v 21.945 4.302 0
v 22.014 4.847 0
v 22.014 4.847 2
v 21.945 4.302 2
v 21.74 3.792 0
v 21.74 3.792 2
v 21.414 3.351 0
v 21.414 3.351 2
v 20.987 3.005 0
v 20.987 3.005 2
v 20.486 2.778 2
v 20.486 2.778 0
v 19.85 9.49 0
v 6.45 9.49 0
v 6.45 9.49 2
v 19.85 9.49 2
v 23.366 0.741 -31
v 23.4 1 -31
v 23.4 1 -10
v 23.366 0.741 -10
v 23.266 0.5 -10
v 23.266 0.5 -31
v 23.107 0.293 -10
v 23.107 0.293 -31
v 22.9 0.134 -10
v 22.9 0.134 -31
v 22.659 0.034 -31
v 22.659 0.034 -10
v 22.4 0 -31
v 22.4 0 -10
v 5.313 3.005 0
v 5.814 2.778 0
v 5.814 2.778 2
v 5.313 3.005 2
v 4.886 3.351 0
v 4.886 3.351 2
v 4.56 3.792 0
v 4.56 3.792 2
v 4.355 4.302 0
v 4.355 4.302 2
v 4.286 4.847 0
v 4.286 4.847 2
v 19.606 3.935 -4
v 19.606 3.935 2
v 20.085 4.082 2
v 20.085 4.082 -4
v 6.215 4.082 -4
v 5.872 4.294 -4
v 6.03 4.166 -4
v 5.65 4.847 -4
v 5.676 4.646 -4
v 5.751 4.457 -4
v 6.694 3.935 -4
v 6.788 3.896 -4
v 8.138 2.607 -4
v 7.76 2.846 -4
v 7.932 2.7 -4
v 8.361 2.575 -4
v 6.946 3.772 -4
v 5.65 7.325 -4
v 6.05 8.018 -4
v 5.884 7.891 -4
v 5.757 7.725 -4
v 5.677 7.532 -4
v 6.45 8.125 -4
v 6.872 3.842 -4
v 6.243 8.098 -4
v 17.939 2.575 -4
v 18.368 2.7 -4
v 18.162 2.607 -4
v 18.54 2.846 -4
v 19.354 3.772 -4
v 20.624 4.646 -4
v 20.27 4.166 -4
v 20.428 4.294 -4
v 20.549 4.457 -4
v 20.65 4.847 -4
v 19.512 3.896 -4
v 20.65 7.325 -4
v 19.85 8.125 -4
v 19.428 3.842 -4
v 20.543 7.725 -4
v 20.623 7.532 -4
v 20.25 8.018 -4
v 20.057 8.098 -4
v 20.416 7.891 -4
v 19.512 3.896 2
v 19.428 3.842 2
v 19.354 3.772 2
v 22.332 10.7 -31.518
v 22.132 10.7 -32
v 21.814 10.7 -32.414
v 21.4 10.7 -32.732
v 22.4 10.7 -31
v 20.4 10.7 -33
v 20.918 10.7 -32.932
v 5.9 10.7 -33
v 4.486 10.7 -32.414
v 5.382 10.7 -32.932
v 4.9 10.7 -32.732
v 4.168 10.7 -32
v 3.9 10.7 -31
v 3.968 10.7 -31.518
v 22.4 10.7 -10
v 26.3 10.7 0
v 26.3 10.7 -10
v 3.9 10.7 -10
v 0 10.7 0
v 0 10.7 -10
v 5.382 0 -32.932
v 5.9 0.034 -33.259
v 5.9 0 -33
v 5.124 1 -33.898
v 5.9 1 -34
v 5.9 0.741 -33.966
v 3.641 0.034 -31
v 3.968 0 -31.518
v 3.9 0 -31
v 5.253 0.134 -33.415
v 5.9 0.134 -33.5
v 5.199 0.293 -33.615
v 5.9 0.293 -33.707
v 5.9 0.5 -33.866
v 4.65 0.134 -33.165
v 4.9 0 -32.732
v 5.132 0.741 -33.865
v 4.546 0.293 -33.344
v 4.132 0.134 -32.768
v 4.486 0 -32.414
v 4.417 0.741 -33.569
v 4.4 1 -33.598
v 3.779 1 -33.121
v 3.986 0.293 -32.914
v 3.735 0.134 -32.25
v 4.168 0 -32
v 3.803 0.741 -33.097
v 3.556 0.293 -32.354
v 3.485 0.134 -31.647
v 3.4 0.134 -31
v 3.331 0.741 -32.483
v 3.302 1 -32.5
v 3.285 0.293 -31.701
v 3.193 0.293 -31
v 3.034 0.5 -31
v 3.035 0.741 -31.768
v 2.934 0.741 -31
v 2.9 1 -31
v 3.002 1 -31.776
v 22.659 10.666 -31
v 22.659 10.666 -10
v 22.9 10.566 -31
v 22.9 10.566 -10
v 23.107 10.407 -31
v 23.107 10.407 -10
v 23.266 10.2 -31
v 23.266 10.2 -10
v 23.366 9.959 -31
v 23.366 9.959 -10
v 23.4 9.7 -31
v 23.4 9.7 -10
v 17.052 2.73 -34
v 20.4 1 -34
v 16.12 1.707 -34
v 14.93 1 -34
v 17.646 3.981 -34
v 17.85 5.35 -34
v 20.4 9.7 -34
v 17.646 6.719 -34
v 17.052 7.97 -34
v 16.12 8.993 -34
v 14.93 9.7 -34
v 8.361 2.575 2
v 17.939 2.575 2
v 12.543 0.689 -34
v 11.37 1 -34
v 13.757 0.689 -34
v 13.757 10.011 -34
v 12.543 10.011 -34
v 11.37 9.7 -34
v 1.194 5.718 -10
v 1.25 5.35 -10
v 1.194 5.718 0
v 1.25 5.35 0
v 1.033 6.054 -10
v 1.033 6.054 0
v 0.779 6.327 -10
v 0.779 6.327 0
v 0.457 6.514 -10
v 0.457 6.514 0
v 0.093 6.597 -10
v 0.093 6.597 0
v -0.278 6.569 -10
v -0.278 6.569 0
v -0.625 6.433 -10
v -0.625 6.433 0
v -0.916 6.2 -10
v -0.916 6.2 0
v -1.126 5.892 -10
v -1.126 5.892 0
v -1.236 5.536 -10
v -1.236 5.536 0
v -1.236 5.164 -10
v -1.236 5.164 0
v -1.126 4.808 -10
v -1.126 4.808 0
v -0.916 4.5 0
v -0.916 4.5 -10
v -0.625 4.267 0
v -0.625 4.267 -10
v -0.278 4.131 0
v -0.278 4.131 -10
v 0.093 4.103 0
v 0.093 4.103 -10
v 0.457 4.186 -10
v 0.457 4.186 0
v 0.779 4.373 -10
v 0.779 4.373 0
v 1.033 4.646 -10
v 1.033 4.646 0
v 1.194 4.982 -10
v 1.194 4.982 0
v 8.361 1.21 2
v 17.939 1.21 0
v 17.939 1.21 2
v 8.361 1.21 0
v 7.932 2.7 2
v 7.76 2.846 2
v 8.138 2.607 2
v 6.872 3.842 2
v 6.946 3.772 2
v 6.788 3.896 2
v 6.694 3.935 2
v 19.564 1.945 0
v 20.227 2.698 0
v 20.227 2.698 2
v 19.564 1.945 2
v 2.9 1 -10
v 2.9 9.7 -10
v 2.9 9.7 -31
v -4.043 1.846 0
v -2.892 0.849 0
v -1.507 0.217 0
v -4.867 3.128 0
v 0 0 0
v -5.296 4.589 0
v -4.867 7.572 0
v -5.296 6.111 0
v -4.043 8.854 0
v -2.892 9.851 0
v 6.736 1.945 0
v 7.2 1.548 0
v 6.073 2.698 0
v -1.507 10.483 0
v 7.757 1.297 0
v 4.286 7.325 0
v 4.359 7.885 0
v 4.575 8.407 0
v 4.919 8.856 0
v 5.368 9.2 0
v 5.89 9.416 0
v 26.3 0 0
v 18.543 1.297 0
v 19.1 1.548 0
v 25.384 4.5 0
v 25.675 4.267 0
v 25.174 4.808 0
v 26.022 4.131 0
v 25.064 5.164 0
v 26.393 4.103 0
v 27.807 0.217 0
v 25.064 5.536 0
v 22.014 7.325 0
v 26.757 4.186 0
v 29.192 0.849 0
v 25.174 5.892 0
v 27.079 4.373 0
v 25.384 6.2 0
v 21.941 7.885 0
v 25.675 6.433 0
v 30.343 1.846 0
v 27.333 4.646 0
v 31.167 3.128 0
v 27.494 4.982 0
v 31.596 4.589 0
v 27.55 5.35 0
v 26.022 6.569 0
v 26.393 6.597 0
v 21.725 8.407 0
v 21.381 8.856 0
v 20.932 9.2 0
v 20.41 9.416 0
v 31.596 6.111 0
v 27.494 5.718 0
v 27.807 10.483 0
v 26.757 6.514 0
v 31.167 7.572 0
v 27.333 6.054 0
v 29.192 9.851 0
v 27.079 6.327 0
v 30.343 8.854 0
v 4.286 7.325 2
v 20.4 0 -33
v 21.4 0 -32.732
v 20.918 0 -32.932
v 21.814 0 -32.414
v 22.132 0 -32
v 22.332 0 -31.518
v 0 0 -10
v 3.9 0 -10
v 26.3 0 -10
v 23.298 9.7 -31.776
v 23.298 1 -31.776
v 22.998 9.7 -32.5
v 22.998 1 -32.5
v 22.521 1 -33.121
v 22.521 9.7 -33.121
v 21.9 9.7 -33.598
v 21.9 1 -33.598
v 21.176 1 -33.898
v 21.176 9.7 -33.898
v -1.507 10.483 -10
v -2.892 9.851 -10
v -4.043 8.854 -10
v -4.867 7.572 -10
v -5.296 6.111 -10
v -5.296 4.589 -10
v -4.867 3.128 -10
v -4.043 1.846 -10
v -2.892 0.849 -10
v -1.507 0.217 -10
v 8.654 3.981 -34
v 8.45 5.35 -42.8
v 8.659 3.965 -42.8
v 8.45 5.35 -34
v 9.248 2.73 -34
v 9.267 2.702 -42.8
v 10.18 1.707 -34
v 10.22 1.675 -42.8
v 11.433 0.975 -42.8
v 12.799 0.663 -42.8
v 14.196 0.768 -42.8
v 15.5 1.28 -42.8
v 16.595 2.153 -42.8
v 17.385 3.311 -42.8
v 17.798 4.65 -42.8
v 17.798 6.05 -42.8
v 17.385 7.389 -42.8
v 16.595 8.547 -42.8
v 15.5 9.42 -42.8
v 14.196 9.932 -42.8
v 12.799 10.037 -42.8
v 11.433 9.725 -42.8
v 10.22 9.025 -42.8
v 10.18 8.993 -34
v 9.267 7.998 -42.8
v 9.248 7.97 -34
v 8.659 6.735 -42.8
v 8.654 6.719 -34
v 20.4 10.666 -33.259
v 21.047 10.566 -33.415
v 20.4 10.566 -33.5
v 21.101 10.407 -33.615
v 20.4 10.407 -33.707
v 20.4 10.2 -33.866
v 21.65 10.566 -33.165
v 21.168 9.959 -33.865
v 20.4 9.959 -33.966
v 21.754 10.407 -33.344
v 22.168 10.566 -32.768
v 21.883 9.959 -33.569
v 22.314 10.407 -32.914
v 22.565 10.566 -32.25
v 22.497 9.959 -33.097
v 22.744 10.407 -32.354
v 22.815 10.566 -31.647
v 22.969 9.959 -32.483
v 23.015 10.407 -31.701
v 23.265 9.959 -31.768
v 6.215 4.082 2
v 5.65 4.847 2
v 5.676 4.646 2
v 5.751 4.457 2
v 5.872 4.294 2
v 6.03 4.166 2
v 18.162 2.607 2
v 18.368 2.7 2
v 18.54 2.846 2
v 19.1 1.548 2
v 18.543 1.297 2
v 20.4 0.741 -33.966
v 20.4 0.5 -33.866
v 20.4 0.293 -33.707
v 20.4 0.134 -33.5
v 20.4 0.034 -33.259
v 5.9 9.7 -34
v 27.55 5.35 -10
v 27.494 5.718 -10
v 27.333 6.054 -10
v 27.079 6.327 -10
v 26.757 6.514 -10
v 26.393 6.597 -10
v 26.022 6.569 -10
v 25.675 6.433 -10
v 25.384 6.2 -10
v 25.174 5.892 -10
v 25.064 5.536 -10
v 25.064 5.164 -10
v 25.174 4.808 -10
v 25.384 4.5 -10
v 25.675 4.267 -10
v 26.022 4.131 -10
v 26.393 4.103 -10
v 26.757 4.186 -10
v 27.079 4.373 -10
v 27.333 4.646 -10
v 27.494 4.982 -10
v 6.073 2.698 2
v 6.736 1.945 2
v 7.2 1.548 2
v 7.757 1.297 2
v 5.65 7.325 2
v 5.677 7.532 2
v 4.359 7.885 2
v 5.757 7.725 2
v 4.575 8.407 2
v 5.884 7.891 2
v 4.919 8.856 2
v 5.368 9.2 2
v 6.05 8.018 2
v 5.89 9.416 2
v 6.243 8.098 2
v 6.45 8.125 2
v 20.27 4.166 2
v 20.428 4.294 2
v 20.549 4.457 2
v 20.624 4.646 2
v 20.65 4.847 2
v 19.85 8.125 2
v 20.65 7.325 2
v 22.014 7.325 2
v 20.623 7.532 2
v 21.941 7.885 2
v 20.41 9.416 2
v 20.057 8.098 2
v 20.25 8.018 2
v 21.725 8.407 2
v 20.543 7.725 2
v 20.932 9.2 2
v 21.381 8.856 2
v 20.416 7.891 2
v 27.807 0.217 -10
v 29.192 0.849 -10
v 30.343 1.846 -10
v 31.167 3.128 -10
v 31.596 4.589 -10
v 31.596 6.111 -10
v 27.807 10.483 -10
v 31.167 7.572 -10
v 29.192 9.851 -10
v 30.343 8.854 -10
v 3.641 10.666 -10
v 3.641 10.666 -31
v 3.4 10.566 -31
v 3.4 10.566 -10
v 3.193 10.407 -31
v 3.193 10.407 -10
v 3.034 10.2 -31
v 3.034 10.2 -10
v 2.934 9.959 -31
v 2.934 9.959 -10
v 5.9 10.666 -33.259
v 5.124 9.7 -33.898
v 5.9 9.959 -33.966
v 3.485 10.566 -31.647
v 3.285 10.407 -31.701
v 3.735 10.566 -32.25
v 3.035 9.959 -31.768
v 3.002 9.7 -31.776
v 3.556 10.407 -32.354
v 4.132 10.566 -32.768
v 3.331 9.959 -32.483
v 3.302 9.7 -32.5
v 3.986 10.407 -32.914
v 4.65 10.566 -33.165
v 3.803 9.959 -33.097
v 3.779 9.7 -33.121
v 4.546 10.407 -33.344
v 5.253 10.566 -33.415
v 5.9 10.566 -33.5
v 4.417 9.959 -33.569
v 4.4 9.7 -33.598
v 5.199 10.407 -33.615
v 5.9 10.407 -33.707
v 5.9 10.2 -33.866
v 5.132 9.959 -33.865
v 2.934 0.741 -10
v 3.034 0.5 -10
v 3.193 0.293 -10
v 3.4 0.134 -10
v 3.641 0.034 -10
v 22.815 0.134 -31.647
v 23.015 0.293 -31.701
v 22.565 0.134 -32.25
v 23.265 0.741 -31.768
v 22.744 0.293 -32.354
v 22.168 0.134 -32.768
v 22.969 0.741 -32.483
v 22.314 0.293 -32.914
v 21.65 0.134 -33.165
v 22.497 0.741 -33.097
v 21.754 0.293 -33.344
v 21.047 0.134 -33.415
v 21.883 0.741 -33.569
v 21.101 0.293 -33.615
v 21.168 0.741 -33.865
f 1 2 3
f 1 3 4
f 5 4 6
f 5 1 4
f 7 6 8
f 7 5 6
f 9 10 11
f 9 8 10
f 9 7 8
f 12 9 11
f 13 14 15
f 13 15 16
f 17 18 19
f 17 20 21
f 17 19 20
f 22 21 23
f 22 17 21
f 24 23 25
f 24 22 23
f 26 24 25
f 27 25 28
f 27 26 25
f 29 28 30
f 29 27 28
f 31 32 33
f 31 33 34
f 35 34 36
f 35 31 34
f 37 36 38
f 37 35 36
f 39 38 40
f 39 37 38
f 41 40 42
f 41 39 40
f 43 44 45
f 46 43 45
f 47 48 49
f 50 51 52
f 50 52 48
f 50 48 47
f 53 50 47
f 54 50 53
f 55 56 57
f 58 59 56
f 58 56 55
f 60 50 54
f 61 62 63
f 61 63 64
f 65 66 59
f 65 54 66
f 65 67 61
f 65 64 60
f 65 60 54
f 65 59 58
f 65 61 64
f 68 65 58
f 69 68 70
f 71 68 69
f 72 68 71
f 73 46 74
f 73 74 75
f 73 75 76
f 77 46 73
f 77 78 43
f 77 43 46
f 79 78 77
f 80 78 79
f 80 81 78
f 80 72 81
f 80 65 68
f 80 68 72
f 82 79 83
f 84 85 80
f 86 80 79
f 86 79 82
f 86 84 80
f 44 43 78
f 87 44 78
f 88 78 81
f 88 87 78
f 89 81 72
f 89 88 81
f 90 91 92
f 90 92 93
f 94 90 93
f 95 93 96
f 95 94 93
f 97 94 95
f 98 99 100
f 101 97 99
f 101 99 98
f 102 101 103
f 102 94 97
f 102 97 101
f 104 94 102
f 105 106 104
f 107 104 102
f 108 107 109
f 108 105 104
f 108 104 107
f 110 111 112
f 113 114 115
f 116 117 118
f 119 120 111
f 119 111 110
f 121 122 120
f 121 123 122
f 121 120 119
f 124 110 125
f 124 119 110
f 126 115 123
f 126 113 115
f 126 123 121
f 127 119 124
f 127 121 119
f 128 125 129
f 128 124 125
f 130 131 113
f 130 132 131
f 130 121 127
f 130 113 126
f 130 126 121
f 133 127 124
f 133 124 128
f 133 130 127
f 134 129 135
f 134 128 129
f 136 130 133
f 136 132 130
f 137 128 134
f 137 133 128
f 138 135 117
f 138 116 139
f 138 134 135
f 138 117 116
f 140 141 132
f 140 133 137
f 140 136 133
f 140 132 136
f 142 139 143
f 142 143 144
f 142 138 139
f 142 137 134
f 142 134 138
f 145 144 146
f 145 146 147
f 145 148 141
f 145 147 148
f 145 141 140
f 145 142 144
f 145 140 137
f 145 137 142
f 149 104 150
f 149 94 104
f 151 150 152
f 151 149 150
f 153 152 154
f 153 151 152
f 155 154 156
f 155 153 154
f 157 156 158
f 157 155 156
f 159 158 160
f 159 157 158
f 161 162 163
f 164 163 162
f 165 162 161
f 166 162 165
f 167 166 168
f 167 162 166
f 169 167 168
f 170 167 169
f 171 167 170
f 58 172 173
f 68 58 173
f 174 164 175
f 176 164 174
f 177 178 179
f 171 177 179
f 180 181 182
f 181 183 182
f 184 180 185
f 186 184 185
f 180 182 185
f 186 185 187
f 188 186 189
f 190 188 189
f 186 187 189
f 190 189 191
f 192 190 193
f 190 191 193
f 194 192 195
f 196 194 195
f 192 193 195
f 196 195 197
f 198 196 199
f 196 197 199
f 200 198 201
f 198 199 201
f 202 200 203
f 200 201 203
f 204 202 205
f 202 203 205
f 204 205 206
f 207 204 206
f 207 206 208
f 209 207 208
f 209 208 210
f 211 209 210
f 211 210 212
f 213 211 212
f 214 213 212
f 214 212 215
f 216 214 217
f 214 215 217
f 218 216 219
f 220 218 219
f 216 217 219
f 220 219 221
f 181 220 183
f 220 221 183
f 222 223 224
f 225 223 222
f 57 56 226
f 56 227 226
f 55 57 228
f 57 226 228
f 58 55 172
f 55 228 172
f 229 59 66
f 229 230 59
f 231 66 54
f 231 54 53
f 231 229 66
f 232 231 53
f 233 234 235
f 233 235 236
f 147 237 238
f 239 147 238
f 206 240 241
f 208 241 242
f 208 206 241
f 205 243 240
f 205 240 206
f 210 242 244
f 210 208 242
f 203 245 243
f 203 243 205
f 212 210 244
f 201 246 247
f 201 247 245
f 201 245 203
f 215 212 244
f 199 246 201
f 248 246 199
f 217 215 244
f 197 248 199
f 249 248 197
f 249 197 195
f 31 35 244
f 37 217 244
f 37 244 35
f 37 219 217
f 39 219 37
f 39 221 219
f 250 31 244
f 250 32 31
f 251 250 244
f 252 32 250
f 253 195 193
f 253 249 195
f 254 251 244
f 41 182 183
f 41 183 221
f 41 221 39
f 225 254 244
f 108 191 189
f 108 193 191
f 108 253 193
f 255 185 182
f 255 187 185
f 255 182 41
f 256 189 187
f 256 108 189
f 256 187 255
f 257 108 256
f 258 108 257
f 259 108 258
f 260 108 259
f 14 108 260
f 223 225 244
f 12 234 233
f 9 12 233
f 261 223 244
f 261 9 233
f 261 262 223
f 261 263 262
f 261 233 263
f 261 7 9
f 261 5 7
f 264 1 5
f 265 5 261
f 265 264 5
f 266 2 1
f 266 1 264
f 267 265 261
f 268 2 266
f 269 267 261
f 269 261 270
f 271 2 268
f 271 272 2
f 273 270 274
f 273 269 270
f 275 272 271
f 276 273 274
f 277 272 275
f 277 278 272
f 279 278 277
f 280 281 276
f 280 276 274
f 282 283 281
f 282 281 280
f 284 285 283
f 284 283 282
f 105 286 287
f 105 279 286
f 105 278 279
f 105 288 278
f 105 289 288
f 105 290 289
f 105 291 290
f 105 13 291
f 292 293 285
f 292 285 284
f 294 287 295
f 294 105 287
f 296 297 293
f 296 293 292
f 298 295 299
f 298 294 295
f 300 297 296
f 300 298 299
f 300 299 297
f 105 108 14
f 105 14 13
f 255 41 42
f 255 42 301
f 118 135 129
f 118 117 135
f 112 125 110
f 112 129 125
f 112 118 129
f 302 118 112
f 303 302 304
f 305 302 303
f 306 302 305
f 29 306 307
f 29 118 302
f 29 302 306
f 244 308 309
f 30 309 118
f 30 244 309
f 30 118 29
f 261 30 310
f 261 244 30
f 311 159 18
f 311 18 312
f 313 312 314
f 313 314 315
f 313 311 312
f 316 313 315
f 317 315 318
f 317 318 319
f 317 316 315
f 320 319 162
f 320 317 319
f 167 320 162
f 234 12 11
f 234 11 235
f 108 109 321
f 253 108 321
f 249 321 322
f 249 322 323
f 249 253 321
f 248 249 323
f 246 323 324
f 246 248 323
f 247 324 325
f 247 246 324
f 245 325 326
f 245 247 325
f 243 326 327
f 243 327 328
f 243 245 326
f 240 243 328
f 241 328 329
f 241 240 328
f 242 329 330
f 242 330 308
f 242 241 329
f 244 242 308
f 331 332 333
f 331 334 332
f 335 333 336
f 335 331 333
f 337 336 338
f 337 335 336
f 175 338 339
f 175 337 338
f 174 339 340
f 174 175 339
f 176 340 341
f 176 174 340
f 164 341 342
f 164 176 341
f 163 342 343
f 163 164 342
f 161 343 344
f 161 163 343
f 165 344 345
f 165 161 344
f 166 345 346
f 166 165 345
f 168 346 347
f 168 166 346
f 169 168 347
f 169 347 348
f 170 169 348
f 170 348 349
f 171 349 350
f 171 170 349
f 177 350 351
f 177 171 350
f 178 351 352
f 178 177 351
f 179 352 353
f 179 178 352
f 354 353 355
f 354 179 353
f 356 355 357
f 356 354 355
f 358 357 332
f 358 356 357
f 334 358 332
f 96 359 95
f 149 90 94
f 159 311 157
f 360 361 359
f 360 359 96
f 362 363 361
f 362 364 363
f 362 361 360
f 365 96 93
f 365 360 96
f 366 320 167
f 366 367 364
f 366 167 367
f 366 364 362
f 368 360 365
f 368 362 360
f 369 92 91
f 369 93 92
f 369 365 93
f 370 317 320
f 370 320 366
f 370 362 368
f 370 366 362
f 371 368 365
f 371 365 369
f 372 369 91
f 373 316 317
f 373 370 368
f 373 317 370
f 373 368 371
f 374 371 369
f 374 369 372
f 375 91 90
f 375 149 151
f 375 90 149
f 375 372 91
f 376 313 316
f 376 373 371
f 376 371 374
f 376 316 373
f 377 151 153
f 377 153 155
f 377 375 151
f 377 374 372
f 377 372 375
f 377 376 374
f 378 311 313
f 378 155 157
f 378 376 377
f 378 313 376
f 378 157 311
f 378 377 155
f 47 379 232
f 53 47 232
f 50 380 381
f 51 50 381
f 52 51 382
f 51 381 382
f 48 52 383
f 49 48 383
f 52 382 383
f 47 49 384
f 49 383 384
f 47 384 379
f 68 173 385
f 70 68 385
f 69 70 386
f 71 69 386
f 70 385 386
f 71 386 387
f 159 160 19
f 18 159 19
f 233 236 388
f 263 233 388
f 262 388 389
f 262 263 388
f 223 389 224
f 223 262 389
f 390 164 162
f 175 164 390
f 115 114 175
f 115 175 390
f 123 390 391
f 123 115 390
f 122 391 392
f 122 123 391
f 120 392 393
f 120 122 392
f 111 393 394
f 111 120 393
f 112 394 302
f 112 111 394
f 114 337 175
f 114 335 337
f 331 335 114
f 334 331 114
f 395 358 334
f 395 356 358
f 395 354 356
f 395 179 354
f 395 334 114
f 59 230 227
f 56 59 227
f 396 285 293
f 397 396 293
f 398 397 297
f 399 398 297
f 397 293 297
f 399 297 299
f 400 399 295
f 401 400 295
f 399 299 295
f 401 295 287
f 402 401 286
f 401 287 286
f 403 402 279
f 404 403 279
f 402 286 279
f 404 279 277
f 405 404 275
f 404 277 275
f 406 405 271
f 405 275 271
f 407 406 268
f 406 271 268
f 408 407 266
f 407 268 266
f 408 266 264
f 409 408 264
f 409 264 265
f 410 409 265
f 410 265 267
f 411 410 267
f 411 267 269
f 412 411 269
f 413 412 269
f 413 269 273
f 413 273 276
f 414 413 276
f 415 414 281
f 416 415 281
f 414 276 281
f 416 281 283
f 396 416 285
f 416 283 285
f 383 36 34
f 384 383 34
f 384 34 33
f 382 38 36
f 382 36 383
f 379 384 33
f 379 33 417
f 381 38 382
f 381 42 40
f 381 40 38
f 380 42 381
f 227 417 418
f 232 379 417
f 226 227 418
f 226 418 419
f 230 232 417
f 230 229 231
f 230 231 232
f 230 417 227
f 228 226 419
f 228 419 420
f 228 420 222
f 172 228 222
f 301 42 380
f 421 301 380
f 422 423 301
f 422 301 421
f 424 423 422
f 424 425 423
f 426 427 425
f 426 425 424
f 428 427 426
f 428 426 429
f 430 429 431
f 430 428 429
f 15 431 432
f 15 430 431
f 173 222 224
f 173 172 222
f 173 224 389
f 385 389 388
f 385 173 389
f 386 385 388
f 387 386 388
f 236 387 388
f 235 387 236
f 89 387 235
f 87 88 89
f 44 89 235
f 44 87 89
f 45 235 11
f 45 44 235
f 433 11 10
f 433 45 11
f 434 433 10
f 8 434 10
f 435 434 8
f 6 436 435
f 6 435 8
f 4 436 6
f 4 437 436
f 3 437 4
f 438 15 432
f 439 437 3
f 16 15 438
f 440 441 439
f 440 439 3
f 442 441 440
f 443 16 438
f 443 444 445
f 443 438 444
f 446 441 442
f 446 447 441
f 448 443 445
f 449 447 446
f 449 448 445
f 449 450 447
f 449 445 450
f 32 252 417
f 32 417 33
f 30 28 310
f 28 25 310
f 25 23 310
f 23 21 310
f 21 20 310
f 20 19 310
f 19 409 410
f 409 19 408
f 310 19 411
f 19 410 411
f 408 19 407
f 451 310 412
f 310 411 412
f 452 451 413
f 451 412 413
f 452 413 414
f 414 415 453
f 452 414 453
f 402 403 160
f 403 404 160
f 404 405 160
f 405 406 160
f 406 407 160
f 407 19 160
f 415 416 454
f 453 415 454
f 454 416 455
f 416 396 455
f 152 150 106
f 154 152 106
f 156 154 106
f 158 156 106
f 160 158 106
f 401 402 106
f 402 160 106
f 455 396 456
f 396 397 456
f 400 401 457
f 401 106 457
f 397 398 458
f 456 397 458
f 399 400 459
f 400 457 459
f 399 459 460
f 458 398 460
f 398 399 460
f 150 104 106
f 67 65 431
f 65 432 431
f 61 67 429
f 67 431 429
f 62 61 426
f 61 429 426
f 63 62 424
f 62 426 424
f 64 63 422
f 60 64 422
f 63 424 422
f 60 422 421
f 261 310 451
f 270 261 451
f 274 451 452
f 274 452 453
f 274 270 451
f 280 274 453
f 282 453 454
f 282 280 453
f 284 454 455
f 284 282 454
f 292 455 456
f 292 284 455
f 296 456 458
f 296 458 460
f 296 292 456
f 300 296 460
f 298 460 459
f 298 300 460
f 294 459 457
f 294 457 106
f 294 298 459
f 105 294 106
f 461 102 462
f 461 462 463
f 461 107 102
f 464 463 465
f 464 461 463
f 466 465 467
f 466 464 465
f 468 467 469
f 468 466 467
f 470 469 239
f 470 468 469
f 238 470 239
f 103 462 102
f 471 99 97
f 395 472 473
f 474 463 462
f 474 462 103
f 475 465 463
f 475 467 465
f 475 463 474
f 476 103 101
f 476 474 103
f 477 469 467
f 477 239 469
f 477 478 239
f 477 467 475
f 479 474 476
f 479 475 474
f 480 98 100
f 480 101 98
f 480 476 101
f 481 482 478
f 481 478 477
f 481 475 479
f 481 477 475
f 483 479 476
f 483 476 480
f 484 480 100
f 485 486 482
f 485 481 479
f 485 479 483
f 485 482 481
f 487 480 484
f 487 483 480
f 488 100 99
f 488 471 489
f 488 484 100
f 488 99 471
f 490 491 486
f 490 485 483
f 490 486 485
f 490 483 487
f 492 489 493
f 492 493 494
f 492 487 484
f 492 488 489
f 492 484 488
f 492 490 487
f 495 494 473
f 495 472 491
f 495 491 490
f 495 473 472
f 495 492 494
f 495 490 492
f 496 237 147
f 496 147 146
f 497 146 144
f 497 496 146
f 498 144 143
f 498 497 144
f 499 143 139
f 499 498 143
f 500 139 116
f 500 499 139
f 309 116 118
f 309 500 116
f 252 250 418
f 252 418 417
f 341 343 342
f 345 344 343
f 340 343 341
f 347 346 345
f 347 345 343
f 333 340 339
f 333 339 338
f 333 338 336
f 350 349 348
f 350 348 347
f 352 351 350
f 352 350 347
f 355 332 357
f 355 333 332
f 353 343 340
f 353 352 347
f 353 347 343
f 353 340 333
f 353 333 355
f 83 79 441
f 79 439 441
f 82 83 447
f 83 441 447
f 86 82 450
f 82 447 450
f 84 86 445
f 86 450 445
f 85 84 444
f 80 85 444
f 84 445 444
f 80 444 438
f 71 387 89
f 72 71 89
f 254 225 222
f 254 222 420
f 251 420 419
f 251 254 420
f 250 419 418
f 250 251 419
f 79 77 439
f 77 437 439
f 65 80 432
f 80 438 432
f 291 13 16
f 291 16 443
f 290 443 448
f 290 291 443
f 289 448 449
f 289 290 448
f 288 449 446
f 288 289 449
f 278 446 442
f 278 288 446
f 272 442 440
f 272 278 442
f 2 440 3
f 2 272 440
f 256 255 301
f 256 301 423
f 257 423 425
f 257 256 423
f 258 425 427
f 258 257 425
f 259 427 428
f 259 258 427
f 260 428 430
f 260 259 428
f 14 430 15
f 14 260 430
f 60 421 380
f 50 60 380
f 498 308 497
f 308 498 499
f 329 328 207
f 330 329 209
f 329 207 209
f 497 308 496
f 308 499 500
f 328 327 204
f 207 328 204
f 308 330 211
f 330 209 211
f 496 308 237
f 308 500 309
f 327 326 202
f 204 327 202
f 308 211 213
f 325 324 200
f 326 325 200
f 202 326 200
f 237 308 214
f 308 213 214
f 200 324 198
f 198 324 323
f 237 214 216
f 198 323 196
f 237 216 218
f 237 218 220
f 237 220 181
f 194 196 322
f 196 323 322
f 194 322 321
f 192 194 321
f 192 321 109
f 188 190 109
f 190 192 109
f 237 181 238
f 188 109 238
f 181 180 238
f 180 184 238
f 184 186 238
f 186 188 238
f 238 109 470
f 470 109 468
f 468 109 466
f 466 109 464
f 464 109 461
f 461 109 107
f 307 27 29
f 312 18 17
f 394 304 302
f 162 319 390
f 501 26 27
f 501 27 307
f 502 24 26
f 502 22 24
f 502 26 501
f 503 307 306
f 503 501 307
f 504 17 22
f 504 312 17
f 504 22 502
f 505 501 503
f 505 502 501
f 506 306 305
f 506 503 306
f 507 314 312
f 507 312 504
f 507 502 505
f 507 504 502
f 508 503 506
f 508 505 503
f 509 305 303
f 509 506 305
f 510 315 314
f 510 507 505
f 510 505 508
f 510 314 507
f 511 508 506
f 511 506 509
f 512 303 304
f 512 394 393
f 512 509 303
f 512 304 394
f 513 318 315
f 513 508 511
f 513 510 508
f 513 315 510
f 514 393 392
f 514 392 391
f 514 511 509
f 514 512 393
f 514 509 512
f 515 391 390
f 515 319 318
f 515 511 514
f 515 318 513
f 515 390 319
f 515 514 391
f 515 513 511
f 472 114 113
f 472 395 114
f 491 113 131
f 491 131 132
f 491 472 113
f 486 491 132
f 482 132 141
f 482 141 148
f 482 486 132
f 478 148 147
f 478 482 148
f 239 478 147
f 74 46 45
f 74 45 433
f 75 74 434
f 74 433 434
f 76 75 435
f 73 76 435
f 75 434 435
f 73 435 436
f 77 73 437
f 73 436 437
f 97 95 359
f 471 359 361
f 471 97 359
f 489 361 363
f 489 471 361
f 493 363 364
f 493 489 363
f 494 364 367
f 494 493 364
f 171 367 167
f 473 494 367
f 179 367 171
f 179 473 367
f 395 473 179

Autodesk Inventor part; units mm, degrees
ref_plane "YZ Plane" through (0, 0, 0) normal (1, 0, 0) x (0, 1, 0)
ref_plane "XZ Plane" through (0, 0, 0) normal (0, 1, 0) x (-1, 0, 0)
ref_plane "XY Plane" through (0, 0, 0) normal (0, 0, 1) x (1, 0, 0)
sketch "Sketch1" plane through (0, 0, 0) normal (0, 0, 1) x (1, 0, 0)
  line L0 (0, 0) -> (26.3, 0)
  line L1 (26.3, 10.7) -> (0, 10.7)
  arc A0 (0, 10.7) -> (0, 0) centre (0, 5.35) ccw
  arc A1 (26.3, 0) -> (26.3, 10.7) centre (26.3, 5.35) ccw
  circle A2 centre (0, 5.35) radius 1.25
  circle A3 centre (26.3, 5.35) radius 1.25
  dimension "d0" = 26.3
  dimension "d1" = 10.7
  dimension "d2" = 2.5
extrude "Extrusion1" add sketch "Sketch1" against normal blind 10
sketch "Sketch2" plane through (0, 0, 0) normal (0, 0, 1) x (1, 0, 0)
  line L0 (0, 0) -> (26.3, 0) projected
  arc A0 (0, 10.7) -> (0, 0) centre (0, 5.35) ccw projected
  line L1 (6.9455, 3.7725) -> (7.7604, 2.8465)
  line L2 (8.361, 2.575) -> (17.939, 2.575)
  line L3 (18.5396, 2.8465) -> (19.3545, 3.7725)
  line L4 (19.6057, 3.9348) -> (20.0852, 4.0824)
  line L5 (20.65, 4.847) -> (20.65, 7.325)
  line L6 (19.85, 8.125) -> (6.45, 8.125)
  line L7 (5.65, 7.325) -> (5.65, 4.847)
  line L8 (6.2148, 4.0824) -> (6.6943, 3.9348)
  line L9 (26.3, 10.7) -> (0, 10.7) projected
  arc A1 (6.45, 8.125) -> (5.65, 7.325) centre (6.45, 7.325) ccw
  arc A2 (20.65, 7.325) -> (19.85, 8.125) centre (19.85, 7.325) ccw
  arc A3 (5.65, 4.847) -> (6.2148, 4.0824) centre (6.45, 4.847) ccw
  arc A4 (20.0852, 4.0824) -> (20.65, 4.847) centre (19.85, 4.847) ccw
  arc A5 (6.9455, 3.7725) -> (6.6943, 3.9348) centre (6.5326, 3.4092) ccw
  arc A6 (19.6057, 3.9348) -> (19.3545, 3.7725) centre (19.7674, 3.4092) ccw
  arc A7 (7.7604, 2.8465) -> (8.361, 2.575) centre (8.361, 3.375) ccw
  arc A8 (17.939, 2.575) -> (18.5396, 2.8465) centre (17.939, 3.375) ccw
  line L10 (6.45, 9.4895) -> (19.85, 9.4895)
  arc A9 (22.0145, 7.325) -> (19.85, 9.4895) centre (19.85, 7.325) ccw
  line L11 (22.0145, 7.325) -> (22.0145, 4.847)
  arc A10 (20.4865, 2.7782) -> (22.0145, 4.847) centre (19.85, 4.847) ccw
  line L12 (20.4865, 2.7782) -> (20.2268, 2.6983)
  line L13 (20.2268, 2.6983) -> (19.5639, 1.945)
  arc A11 (17.939, 1.2105) -> (19.5639, 1.945) centre (17.939, 3.375) ccw
  line L14 (17.939, 1.2105) -> (8.361, 1.2105)
  arc A12 (6.7361, 1.945) -> (8.361, 1.2105) centre (8.361, 3.375) ccw
  line L15 (6.7361, 1.945) -> (6.0732, 2.6983)
  line L16 (6.0732, 2.6983) -> (5.8135, 2.7782)
  arc A13 (4.2855, 4.847) -> (5.8135, 2.7782) centre (6.45, 4.847) ccw
  line L17 (4.2855, 4.847) -> (4.2855, 7.325)
  arc A14 (6.45, 9.4895) -> (4.2855, 7.325) centre (6.45, 7.325) ccw
  point P0 (6.8428, 3.8892)
  point P1 (7.9994, 2.575)
  point P2 (18.3006, 2.575)
  point P3 (19.4572, 3.8892)
  point P4 (20.65, 4.2561)
  point P5 (20.65, 8.125)
  point P6 (5.65, 8.125)
  point P7 (5.65, 4.2561)
  dimension "d25" = 15
  dimension "d26" = 5.55
  dimension "d27" = 5.65
  dimension "d28" = 2.575
  dimension "d29" = 0.8
  dimension "d30" = 0.8
  dimension "d32" = 107.1
  dimension "d34" = 107.1
  dimension "d35" = 41.35
  dimension "d36" = 41.35
  dimension "d37" = 0.55
  dimension "d38" = 0.8
  dimension "d39" = 2.711
  dimension "d40" = 2.711
  dimension "d42" = 2.478
  dimension "d43" = 2.478
  dimension "d44" = 1.3645
extrude "Extrusion4" add sketch "Sketch2" along normal blind 2 contours A5 L8 A3 L7 A1 L6 A2 L5 A4 L4 A6 L3 A8 L2 A7 L1 | L10 A9 L11 A10 L12 L13 A11 L14 A12 L15 L16 A13 L17 A14
extrude "Extrusion5" cut sketch "Sketch2" against normal blind 4 and the other way blind 2 contours A5 L8 A3 L7 A1 L6 A2 L5 A4 L4 A6 L3 A8 L2 A7 L1
sketch "Sketch3" plane through (0, 0, -10) normal (0, 0, -1) x (-1, 0, 0)
  line L0 (-23.4, 0) -> (-2.9, 0)
  line L1 (-2.9, 0) -> (-2.9, 10.7)
  line L2 (-2.9, 10.7) -> (-23.4, 10.7)
  line L3 (-23.4, 10.7) -> (-23.4, 0)
  line L4 (0, 10.7) -> (-26.3, 10.7) projected
  arc A0 (-26.3, 10.7) -> (-26.3, 0) centre (-26.3, 5.35) ccw projected
  line L5 (-26.3, 0) -> (0, 0) projected
  dimension "d47" = 20.5
  dimension "d51" = 2.9
extrude "Extrusion6" add sketch "Sketch3" along normal blind 24 contours L3 L2 L1 L0
sketch "Sketch4" plane through (2.9, 10.7, -10) normal (0, 1, 0) x (-1, 0, 0)
  line L0 (-20.5, 0) -> (-20.5, -24) projected
  line L1 (-20.5, -24) -> (0, -24) projected
  arc A0 (-20.5, -21) -> (-17.5, -24) centre (-17.5, -21) ccw
  arc A1 (-3, -24) -> (0, -21) centre (-3, -21) ccw
  line L2 (-20.5, -21) -> (-20.5, -24)
  line L3 (-20.5, -24) -> (-17.5, -24)
  line L4 (-3, -24) -> (0, -24)
  line L5 (0, -24) -> (0, -21)
  line L6 (0, 0) -> (0, -24) projected
  point P0 (2.9, 10)
  dimension "d58" = 3
  dimension "d59" = 3
  dimension "d63" = 3
  dimension "d64" = 3
  dimension "d65" = 3
  dimension "d66" = 3
extrude "Extrusion7" cut sketch "Sketch4" against normal through all
fillet "Fillet1" radius 1 10 edges at (22.5213, 10.7, -33.1213) (13.15, 10.7, -34) (3.7787, 10.7, -33.1213) (2.9, 10.7, -20.5) (23.4, 10.7, -20.5) (22.5213, 0, -33.1213) (13.15, 0, -34) (3.7787, 0, -33.1213) (2.9, 0, -20.5) (23.4, 0, -20.5)
sketch "Sketch5" plane through (0, 0, -34) normal (0, 0, -1) x (-1, 0, 0)
  circle A0 centre (-13.15, 5.35) radius 4.7
  line L0 (-5.9, 10.7) -> (-20.4, 10.7) projected
  line L1 (-23.4, 1) -> (-23.4, 9.7) projected
  point P0 (0, 0)
  dimension "d67" = 9.4
  dimension "d68" = 5.35
  dimension "d69" = 10.25
extrude "Extrusion8" add sketch "Sketch5" along normal blind 8.8
equation "\"d27\" = -0.5 * d25 + 0.5 * d0"
equation "\"d28\" = -0.5 * d26 + 0.5 * d1"
equation "\"d34\" = d32"
equation "\"d36\" = d35"
equation "\"d40\" = d39"
equation "\"d43\" = d42"
equation "\"d51\" = -0.5 * d47 + 0.5 * d0"
equation "\"d58\" = d54"
equation "\"d59\" = d54"
equation "\"d63\" = d54"
equation "\"d64\" = d54"
equation "\"d65\" = d54"
equation "\"d66\" = d54"
equation "\"d68\" = 0.5 * d1"
equation "\"d69\" = 0.5 * d47"
equation "\"d54\" = 3"
properties part number "hdmi-panel-mount"
